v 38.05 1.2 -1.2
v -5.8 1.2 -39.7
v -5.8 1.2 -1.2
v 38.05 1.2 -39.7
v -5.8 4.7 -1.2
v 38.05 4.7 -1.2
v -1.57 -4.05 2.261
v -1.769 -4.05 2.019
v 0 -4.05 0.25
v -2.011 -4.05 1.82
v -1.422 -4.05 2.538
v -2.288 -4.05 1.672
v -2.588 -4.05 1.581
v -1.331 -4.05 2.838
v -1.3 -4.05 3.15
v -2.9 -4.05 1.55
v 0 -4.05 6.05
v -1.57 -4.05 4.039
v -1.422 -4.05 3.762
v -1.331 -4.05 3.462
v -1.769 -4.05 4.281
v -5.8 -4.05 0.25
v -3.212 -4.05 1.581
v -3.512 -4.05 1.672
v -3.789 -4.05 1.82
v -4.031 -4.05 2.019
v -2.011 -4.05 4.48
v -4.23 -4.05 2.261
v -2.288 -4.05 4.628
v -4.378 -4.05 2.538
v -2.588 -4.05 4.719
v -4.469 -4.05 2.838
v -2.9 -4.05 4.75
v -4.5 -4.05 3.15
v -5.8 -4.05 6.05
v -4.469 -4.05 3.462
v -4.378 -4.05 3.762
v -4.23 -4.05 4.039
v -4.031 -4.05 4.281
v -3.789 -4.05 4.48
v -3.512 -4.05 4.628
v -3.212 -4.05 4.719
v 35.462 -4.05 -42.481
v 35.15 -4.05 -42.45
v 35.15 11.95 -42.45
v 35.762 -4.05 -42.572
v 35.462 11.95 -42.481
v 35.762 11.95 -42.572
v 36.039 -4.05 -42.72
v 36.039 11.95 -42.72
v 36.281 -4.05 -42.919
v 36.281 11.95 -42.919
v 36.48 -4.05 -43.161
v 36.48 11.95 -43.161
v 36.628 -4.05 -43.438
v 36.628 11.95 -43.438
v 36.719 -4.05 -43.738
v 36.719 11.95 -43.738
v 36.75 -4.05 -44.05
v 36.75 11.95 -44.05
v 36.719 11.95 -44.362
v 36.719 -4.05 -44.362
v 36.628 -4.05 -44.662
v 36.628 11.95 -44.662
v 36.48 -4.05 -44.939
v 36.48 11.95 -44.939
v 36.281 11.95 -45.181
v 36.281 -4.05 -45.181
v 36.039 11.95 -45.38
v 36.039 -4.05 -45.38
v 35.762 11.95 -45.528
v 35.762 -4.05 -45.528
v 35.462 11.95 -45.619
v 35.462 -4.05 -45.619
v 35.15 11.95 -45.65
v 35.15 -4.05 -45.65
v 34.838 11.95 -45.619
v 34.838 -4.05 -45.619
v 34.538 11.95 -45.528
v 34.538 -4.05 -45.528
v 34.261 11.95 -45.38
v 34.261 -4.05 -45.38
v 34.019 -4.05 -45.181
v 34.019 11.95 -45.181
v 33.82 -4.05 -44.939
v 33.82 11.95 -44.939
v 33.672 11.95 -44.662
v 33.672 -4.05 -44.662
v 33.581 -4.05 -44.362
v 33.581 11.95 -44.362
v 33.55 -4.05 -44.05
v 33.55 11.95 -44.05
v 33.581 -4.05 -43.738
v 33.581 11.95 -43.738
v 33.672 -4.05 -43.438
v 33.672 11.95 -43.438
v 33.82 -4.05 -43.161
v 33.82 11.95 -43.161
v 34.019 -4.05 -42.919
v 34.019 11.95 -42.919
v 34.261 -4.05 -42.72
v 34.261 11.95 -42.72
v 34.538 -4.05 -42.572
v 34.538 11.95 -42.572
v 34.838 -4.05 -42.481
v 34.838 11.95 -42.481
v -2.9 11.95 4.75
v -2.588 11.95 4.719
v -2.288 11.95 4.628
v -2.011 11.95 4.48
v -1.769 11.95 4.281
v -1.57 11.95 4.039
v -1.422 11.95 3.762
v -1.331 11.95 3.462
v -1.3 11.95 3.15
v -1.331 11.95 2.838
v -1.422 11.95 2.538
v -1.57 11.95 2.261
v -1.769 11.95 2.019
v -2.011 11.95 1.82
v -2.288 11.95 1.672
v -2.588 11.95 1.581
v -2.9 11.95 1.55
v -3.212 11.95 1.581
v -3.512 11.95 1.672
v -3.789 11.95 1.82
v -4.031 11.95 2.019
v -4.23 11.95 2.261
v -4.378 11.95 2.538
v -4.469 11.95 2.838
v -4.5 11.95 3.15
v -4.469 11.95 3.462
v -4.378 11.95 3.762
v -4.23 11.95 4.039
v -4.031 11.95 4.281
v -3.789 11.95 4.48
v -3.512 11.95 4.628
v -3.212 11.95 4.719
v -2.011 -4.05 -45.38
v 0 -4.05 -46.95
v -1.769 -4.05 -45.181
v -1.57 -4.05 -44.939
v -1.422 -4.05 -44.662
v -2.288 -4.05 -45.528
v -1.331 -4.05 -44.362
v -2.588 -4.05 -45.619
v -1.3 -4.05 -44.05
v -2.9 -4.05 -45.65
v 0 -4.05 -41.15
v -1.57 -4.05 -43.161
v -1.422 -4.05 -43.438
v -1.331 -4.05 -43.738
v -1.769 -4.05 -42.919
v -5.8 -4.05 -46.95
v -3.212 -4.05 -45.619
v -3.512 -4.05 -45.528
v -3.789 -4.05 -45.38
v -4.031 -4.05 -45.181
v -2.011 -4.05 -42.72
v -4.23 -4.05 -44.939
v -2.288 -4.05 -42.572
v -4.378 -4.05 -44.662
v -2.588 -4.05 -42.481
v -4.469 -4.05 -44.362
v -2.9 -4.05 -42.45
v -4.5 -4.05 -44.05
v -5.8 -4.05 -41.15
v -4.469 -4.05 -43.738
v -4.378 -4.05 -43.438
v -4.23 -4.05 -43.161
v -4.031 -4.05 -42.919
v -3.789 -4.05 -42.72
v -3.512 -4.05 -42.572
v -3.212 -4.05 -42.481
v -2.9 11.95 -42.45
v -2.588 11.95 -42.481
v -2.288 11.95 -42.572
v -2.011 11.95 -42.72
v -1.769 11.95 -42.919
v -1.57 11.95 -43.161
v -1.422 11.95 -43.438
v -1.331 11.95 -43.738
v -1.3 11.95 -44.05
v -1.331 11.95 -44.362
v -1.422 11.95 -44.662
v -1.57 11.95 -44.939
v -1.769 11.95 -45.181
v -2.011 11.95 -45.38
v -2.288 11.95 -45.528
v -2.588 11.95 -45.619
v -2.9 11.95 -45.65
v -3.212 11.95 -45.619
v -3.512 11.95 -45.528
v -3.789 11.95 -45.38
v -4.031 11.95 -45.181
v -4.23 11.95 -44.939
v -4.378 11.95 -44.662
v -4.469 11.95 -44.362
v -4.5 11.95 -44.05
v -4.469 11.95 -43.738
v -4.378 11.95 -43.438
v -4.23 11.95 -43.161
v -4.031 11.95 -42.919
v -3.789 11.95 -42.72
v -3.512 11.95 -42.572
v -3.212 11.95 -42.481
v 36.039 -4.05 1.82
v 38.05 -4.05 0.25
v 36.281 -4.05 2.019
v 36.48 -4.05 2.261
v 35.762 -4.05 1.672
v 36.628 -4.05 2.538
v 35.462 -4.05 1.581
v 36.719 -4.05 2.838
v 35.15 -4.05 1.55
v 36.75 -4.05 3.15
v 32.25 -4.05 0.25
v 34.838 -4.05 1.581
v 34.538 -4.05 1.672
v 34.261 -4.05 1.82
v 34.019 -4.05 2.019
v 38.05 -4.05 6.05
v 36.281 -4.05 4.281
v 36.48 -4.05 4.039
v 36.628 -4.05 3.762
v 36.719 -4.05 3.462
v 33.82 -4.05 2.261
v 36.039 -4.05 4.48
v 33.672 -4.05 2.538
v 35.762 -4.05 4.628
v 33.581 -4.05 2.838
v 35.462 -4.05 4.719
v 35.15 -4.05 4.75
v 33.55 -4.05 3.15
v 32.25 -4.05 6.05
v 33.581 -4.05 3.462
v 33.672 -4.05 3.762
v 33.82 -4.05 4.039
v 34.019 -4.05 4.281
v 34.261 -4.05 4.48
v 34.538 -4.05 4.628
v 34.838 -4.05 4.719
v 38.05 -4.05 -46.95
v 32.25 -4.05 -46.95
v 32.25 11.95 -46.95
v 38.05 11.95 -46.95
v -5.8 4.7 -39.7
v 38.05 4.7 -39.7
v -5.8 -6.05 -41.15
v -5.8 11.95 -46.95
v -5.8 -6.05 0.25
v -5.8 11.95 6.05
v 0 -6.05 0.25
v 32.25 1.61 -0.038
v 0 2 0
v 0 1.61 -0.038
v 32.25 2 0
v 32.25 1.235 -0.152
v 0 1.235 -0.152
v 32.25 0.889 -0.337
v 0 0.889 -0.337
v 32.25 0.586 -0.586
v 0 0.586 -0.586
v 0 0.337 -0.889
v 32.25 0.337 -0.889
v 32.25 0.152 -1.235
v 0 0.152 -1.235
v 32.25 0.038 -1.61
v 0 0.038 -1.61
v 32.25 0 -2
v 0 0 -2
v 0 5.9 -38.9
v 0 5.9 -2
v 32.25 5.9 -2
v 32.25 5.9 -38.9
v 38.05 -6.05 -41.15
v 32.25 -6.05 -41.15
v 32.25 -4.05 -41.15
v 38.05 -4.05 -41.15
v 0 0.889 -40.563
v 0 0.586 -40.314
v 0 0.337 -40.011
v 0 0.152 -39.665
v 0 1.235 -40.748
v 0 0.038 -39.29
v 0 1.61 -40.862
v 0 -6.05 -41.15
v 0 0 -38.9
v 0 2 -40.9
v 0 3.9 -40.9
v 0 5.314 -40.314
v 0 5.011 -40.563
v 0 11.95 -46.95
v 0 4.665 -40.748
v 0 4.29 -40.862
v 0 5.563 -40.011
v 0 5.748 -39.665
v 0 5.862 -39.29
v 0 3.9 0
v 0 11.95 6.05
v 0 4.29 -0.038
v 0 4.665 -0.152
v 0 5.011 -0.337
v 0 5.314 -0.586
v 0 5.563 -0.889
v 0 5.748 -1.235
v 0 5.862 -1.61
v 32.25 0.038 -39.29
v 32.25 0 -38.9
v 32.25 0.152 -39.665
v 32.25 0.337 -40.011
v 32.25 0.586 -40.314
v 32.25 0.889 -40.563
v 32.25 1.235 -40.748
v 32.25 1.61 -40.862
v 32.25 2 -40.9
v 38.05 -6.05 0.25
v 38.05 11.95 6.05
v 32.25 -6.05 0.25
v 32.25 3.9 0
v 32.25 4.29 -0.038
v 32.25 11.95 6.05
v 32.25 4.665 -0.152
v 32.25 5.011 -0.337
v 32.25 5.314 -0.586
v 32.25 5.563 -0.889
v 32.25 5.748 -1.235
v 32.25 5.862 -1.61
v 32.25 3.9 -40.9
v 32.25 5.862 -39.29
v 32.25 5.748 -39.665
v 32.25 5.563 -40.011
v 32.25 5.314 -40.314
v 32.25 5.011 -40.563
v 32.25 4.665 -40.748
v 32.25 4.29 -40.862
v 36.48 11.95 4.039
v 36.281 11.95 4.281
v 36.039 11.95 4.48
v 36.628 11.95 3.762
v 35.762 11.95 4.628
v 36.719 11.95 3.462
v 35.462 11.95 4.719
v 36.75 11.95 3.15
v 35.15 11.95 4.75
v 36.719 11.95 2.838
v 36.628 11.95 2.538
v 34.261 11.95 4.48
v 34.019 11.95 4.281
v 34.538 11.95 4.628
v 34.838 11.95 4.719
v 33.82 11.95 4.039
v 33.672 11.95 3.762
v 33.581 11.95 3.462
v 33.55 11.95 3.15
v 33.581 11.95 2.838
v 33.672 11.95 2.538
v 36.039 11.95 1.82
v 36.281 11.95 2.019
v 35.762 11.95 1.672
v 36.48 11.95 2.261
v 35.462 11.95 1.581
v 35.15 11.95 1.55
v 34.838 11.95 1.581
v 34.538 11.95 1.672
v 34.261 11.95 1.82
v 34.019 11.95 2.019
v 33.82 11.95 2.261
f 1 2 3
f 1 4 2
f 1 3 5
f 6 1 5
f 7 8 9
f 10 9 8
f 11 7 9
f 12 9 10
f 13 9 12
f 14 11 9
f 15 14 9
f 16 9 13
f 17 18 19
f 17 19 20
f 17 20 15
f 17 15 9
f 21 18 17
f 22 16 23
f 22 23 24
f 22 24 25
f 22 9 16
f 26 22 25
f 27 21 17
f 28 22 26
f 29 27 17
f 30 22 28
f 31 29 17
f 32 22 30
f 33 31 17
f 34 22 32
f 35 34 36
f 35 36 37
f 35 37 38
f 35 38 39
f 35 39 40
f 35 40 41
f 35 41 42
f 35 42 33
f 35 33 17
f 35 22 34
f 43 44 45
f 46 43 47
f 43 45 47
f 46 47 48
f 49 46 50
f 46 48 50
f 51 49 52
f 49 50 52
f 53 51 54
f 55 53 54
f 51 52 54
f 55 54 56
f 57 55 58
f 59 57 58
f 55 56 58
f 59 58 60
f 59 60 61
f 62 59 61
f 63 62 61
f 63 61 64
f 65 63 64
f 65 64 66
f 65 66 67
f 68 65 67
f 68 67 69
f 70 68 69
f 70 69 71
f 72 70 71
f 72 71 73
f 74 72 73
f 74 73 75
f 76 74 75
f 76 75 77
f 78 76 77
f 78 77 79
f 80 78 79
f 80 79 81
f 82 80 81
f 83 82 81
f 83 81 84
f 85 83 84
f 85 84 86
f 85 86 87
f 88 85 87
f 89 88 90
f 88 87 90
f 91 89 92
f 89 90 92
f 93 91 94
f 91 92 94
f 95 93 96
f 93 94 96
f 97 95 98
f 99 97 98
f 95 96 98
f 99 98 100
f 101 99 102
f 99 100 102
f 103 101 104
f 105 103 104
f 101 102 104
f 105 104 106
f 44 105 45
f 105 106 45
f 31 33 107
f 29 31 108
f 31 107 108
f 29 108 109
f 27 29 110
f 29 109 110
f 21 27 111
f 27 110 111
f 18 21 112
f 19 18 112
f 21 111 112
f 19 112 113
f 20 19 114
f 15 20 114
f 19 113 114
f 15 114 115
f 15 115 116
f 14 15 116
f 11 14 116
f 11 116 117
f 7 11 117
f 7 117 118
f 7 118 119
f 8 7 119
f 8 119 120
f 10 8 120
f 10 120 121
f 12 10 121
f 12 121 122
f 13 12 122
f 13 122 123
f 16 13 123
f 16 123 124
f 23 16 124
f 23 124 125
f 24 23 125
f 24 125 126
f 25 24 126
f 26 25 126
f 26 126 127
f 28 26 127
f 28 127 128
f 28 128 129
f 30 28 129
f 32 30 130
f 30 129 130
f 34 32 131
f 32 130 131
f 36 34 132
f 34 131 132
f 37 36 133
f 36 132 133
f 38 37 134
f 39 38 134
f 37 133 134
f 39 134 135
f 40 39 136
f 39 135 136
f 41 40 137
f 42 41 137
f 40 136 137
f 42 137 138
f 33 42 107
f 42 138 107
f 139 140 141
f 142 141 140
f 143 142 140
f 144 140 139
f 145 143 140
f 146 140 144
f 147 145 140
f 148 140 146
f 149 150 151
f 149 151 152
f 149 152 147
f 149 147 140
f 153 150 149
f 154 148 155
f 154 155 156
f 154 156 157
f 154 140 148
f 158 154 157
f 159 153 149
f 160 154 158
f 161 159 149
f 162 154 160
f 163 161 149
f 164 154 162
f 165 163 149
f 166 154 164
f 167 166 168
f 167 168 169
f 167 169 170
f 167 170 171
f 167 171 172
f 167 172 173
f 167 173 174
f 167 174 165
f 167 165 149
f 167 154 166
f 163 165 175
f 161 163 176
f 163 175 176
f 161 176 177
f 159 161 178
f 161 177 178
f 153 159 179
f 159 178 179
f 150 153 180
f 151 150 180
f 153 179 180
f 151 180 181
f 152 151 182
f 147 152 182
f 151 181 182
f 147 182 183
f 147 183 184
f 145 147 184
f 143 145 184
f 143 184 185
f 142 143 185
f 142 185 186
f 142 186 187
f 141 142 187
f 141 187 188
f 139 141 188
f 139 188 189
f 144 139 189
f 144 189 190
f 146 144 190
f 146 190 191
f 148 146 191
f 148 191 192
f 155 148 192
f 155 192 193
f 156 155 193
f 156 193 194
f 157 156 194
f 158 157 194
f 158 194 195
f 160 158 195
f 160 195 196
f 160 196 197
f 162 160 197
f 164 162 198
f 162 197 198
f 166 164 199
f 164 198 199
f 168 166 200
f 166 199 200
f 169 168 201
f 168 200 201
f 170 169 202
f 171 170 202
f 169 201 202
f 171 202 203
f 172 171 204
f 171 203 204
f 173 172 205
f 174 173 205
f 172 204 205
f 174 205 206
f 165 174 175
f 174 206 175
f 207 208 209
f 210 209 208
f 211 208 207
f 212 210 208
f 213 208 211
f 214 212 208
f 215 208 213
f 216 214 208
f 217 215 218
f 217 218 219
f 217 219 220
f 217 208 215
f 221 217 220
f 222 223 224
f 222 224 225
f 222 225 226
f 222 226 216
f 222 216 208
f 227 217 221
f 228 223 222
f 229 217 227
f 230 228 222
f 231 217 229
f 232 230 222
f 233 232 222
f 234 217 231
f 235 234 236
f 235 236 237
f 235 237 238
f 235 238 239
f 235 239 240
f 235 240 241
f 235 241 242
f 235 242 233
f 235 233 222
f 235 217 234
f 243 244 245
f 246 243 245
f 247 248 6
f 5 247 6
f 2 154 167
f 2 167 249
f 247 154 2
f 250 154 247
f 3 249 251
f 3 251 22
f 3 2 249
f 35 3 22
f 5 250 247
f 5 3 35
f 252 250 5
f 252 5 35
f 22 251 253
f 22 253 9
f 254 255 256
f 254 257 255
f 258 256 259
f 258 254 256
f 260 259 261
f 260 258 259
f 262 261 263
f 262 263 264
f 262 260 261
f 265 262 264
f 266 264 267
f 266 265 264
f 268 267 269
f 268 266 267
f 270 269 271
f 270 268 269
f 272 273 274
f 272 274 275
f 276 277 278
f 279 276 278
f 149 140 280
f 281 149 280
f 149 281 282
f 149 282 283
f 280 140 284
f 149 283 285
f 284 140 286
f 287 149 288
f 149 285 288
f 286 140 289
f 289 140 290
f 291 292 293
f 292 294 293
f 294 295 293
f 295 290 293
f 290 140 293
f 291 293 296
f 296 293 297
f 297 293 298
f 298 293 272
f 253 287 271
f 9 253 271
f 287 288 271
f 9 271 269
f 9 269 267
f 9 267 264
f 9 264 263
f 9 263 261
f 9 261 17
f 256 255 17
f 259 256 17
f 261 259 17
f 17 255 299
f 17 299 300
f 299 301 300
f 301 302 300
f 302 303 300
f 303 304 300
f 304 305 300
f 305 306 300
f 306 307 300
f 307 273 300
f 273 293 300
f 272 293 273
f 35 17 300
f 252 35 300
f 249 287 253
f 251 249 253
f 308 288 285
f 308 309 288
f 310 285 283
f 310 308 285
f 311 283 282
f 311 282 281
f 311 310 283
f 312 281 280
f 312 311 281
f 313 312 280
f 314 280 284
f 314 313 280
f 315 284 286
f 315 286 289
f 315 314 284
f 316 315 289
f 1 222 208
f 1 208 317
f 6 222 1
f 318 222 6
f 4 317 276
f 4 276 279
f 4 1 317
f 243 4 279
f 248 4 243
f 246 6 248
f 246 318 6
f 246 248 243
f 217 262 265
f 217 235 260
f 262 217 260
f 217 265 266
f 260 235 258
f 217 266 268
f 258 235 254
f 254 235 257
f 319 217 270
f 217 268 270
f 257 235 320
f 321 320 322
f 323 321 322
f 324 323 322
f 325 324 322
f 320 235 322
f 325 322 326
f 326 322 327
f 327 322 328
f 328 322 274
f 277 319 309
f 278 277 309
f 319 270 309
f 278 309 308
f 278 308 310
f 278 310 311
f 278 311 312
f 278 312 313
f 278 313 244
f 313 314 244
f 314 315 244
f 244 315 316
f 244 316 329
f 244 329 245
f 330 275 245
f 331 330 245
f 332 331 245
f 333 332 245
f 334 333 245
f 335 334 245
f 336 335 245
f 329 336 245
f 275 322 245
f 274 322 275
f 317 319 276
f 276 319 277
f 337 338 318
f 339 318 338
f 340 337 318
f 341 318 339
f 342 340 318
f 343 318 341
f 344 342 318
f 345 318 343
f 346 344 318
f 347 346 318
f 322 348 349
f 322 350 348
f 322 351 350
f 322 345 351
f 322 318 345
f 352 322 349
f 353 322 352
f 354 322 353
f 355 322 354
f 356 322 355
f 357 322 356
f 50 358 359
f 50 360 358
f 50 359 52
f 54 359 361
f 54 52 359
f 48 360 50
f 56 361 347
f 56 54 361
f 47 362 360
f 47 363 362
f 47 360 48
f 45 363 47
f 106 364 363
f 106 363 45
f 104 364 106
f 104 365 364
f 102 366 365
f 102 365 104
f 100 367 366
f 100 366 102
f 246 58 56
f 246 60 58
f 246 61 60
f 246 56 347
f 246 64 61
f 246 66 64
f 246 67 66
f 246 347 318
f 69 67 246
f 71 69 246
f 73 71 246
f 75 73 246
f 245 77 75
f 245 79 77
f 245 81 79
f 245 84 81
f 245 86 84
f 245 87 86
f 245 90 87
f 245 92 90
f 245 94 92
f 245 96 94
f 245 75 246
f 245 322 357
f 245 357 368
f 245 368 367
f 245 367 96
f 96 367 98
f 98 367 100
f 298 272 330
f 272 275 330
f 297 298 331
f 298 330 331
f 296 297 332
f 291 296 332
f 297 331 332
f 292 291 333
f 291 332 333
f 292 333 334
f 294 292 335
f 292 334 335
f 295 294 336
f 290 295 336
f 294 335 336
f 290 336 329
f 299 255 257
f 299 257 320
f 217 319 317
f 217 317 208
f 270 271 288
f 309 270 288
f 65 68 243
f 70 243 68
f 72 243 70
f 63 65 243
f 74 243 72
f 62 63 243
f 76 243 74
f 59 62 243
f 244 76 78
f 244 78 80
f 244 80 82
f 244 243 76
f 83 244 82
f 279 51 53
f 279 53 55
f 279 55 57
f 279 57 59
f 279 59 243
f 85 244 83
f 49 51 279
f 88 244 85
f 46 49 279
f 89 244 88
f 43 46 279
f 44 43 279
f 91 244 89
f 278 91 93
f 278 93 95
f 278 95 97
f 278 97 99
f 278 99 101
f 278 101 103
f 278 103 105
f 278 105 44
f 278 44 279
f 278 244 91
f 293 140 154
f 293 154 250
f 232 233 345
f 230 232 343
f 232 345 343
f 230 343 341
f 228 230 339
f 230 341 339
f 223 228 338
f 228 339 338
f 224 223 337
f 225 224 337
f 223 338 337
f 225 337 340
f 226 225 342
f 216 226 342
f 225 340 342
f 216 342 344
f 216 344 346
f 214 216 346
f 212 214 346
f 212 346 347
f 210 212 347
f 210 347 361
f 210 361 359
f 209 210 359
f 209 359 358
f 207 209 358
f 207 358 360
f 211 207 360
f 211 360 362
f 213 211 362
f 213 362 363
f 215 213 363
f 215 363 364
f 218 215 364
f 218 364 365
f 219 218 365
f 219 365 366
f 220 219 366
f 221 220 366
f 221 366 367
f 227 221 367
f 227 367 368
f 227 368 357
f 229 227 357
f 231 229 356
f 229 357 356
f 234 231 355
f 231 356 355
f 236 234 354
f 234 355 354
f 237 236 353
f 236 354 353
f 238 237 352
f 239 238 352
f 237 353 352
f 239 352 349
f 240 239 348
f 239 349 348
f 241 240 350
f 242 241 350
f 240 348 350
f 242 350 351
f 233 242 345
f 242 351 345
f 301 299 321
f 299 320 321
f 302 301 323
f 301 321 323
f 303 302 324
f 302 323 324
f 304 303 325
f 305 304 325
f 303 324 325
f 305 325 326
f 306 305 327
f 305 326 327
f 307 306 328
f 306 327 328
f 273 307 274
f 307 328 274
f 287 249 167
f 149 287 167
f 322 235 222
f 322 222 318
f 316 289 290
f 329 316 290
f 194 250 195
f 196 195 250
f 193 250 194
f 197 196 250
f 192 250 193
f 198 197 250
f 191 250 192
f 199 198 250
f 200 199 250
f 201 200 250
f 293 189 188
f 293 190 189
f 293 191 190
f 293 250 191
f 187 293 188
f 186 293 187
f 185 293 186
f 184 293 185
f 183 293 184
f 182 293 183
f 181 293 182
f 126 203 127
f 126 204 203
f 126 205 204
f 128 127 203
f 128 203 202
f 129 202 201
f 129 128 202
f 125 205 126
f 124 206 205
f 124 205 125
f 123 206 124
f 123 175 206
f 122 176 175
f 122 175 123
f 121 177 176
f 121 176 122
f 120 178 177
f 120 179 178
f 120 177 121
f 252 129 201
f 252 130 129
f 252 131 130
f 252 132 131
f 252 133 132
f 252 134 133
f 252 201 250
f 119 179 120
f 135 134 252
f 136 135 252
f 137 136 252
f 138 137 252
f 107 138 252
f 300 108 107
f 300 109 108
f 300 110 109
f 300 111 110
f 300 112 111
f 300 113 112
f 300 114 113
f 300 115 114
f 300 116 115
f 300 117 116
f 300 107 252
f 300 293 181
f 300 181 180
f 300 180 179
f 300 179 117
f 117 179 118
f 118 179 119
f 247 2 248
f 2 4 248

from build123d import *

# Parameters (mm, degrees)
SKETCH1_W           = 40.9
SKETCH1_H           = 5.9
SKETCH1_W_2         = 38.5
SKETCH1_H_2         = 3.5
BOSS_EXTRUDE1_DEPTH = 32.25
FILLET2_R           = 2
SKETCH2_W           = 53
SKETCH2_H           = 18
SKETCH2_W_2         = 38.5
SKETCH2_H_2         = 3.5
BOSS_EXTRUDE2_DEPTH = 5.8
SKETCH3_W           = 53
SKETCH3_H           = 18
SKETCH3_W_2         = 38.5
SKETCH3_H_2         = 3.5
BOSS_EXTRUDE3_DEPTH = 5.8
SKETCH4_R           = 1.6
CUT_EXTRUDE1_DEPTH  = 64.056363676
SKETCH15_W          = 38.5
SKETCH15_H          = 3.5
SKETCH15_W_2        = 5.8
SKETCH15_H_2        = 2
CUT_EXTRUDE5_DEPTH  = 66.344682263


with BuildPart() as part:
    # Sketch1 → Boss-Extrude1 (new body)
    with BuildSketch(Plane(origin=(0, 0, 0), x_dir=(0, 0, -1), z_dir=(1, 0, 0))):
        with Locations((20.45, 2.95)):
            Rectangle(SKETCH1_W, SKETCH1_H)
        with Locations((20.45, 2.95)):
            Rectangle(SKETCH1_W_2, SKETCH1_H_2, mode=Mode.SUBTRACT)
    extrude(amount=BOSS_EXTRUDE1_DEPTH)

    # Fillet2
    fillet2_edges = [part.edges().sort_by_distance(p)[0] for p in [
        (16.125, 0, -40.9),
        (16.125, 0, 0),
        (16.125, 5.9, 0),
        (16.125, 5.9, -40.9),
    ]]
    fillet(fillet2_edges, radius=FILLET2_R)

    # Sketch2 → Boss-Extrude2 (add)
    with BuildSketch(Plane(origin=(32.25, 0, 0), x_dir=(0, 0, -1), z_dir=(1, 0, 0))):
        with Locations((20.45, 2.95)):
            Rectangle(SKETCH2_W, SKETCH2_H)
        with Locations((20.45, 2.95)):
            Rectangle(SKETCH2_W_2, SKETCH2_H_2, mode=Mode.SUBTRACT)
    extrude(amount=BOSS_EXTRUDE2_DEPTH)

    # Sketch3 → Boss-Extrude3 (add)
    with BuildSketch(Plane.ZY):
        with Locations((-20.45, 2.95)):
            Rectangle(SKETCH3_W, SKETCH3_H)
        with Locations((-20.45, 2.95)):
            Rectangle(SKETCH3_W_2, SKETCH3_H_2, mode=Mode.SUBTRACT)
    extrude(amount=BOSS_EXTRUDE3_DEPTH)

    # Sketch4 → Cut-Extrude1 (cut, through all)
    with BuildSketch(Plane(origin=(0, 11.95, 0), x_dir=(1, 0, 0), z_dir=(0, 1, 0))):
        with Locations((-2.9, 44.05)):
            Circle(SKETCH4_R)
        with Locations((35.15, 44.05)):
            Circle(SKETCH4_R)
        with Locations((-2.9, -3.15)):
            Circle(SKETCH4_R)
        with Locations((35.15, -3.15)):
            Circle(SKETCH4_R)
    extrude(amount=-CUT_EXTRUDE1_DEPTH, mode=Mode.SUBTRACT)

    # Sketch15 → Cut-Extrude5 (cut, through all)
    with BuildSketch(Plane.ZY.offset(5.8)):
        with Locations((-20.45, 2.95)):
            Rectangle(SKETCH15_W, SKETCH15_H)
        with Locations((-44.05, -5.05)):
            Rectangle(SKETCH15_W_2, SKETCH15_H_2)
        with Locations((3.15, -5.05)):
            Rectangle(SKETCH15_W_2, SKETCH15_H_2)
    extrude(amount=-CUT_EXTRUDE5_DEPTH, mode=Mode.SUBTRACT)


solid = part.part
